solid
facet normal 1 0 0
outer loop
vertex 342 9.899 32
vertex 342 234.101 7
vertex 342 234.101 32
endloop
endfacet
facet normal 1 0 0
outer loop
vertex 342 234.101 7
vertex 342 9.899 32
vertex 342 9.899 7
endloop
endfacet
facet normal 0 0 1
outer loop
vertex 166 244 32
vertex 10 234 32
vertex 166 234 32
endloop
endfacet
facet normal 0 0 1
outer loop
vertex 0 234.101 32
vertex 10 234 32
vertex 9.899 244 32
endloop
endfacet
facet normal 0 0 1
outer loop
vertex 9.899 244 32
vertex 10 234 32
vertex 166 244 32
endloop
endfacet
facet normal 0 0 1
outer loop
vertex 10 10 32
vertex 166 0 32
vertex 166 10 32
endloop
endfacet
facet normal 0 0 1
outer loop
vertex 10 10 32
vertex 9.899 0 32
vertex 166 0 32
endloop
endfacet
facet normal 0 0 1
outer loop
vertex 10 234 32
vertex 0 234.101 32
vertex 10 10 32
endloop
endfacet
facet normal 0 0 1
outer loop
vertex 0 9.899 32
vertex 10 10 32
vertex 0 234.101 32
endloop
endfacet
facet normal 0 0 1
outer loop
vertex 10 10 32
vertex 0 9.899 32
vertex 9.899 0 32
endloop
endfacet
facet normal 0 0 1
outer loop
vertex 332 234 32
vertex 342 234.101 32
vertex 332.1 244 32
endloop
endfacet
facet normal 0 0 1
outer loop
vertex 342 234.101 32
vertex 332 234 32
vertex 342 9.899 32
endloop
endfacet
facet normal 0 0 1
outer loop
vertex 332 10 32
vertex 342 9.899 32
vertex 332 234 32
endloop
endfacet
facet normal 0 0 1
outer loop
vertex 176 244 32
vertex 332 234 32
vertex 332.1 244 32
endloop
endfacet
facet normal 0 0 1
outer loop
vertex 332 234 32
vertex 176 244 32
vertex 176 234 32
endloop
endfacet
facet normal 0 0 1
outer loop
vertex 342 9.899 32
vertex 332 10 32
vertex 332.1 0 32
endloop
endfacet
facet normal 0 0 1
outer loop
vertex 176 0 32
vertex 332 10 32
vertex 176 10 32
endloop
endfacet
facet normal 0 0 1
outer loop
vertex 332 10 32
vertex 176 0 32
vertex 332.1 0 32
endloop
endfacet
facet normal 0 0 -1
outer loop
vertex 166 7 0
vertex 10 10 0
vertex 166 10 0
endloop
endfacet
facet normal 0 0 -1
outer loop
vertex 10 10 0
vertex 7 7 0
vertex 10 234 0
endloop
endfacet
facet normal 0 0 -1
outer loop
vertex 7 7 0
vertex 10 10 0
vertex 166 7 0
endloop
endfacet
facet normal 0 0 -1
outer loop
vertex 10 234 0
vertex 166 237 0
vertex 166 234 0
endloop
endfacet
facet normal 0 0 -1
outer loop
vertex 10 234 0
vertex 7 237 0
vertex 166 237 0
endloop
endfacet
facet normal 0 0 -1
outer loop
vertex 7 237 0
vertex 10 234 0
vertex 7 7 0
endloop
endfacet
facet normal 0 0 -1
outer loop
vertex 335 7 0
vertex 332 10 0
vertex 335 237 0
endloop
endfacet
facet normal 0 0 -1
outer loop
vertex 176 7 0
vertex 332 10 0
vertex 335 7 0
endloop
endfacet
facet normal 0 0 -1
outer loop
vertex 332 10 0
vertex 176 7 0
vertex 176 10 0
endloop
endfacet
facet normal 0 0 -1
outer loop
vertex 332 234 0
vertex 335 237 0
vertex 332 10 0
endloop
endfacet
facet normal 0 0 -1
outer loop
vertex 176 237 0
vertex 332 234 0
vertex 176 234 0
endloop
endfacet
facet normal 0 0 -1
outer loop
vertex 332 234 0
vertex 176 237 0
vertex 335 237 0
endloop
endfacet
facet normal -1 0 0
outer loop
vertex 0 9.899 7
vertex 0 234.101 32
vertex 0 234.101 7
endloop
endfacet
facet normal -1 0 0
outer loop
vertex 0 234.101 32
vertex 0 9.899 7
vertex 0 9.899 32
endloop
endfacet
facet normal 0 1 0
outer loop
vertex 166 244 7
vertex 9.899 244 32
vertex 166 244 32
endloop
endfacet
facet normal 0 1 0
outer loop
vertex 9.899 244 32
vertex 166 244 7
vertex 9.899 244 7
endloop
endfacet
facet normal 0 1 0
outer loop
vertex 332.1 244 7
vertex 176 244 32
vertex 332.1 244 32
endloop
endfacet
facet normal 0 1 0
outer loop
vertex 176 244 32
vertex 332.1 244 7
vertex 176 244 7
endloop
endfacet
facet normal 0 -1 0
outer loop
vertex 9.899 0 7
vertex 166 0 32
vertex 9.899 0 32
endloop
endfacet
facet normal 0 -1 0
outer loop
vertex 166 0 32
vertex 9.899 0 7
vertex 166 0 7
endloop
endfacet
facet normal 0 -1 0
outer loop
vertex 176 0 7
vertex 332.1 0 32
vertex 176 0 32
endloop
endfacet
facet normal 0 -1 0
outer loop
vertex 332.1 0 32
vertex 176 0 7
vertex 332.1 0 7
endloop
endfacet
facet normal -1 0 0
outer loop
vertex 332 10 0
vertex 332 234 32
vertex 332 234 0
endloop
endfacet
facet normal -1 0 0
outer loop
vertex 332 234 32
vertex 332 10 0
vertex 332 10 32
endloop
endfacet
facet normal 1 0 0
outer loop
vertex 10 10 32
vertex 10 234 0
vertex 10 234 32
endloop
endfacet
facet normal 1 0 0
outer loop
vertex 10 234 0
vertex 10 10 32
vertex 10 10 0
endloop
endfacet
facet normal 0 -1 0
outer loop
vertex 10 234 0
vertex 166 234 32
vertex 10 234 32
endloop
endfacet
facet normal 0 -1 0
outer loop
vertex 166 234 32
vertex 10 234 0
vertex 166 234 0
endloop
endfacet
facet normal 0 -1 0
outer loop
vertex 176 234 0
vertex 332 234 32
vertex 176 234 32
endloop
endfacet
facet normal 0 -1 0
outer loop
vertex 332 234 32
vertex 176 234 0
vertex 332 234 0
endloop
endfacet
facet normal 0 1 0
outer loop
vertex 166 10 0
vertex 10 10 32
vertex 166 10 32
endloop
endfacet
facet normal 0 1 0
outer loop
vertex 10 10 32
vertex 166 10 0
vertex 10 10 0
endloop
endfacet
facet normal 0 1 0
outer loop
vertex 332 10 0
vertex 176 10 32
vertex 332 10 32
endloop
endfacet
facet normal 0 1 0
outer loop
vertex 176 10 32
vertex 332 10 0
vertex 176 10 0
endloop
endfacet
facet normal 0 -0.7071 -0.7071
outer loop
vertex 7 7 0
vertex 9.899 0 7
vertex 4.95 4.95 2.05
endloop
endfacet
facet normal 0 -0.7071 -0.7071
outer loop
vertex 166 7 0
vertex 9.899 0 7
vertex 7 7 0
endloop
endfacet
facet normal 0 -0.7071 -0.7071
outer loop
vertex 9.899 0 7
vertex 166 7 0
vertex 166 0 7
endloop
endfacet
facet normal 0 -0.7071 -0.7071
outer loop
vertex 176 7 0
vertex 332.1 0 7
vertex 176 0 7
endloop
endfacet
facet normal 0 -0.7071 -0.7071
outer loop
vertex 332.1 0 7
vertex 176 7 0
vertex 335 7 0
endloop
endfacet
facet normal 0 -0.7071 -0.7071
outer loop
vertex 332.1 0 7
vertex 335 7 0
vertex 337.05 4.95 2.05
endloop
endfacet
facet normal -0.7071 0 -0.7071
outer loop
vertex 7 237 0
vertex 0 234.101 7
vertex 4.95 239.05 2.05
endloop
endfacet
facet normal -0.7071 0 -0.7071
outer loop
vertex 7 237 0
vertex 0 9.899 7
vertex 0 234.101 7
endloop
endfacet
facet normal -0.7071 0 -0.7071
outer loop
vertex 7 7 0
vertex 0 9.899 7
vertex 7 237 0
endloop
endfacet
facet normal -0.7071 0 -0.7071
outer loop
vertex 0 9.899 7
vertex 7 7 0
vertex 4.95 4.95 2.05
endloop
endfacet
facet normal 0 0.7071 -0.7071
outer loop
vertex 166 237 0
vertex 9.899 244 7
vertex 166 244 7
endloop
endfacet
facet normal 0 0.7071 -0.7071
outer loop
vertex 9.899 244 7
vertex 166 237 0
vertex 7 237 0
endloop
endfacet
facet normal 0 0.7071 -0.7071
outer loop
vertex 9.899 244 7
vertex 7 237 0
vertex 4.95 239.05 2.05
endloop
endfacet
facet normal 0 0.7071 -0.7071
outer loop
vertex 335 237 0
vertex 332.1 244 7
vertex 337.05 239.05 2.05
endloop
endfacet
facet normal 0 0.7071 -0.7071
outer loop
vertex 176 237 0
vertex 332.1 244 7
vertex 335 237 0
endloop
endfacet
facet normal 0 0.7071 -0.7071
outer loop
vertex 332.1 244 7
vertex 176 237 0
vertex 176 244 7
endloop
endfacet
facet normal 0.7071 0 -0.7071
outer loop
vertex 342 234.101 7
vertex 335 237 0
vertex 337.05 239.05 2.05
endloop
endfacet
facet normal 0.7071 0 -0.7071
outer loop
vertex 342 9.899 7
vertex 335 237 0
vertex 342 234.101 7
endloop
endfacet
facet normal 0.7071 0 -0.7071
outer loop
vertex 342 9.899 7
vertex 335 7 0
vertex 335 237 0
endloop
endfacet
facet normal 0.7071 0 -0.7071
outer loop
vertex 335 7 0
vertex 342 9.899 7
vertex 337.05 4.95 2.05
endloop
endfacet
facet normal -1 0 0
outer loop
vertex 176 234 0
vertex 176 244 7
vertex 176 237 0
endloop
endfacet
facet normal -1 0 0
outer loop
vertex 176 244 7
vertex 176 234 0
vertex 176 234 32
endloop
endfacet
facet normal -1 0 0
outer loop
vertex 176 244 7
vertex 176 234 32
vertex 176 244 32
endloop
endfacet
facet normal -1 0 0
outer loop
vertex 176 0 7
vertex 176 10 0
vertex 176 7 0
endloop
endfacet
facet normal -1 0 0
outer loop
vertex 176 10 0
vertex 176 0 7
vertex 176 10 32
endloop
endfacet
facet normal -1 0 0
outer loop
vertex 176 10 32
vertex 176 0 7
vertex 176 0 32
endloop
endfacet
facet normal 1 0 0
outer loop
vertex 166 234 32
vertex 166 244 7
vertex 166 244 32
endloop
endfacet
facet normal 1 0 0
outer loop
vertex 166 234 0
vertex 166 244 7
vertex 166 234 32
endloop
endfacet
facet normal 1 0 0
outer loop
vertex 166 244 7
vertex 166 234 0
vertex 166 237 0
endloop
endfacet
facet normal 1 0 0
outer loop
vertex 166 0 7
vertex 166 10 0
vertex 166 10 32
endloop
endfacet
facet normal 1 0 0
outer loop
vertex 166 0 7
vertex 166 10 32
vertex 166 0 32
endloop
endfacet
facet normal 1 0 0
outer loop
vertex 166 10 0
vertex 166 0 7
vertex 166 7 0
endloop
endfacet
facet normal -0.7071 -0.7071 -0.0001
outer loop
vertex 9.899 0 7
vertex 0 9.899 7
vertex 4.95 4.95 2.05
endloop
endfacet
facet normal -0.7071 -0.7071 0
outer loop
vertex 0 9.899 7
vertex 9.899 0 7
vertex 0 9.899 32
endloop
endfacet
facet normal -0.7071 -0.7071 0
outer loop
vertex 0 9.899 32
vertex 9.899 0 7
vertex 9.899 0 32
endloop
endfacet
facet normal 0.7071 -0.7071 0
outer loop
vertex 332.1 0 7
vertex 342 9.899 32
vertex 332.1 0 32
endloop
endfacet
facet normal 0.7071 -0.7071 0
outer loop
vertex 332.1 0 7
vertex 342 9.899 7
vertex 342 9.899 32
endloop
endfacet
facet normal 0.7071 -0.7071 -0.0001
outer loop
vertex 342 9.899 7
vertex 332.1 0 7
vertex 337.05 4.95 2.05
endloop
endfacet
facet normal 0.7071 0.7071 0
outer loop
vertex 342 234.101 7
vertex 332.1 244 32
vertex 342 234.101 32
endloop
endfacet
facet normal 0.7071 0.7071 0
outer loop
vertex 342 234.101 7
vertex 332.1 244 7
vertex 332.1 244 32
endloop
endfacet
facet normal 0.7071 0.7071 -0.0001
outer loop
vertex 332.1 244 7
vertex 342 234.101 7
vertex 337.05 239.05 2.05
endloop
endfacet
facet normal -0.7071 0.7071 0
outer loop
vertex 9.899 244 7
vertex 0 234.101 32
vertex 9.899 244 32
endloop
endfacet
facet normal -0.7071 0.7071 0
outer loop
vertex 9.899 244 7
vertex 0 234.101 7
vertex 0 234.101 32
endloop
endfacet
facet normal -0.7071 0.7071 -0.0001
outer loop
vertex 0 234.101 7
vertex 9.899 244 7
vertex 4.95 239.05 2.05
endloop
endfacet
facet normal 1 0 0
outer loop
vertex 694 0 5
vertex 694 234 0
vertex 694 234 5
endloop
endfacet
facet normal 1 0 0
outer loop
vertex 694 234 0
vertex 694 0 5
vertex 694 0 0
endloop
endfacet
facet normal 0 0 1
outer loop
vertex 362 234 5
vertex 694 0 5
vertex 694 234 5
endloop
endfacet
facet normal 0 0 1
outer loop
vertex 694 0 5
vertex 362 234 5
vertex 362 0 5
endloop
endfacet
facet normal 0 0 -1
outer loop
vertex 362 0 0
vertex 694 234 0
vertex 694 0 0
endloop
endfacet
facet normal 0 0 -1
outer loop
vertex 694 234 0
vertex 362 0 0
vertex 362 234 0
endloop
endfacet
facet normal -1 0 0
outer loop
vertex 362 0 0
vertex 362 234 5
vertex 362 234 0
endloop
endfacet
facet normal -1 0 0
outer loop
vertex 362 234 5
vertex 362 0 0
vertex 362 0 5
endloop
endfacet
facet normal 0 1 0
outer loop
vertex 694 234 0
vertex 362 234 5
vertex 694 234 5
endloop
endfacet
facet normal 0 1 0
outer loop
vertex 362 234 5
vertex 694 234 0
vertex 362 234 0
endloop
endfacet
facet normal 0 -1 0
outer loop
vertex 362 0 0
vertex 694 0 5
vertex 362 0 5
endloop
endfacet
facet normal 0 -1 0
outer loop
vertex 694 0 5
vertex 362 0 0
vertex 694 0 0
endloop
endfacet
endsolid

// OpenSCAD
thick = 10;
plate = [342, 244, 5] - [thick, thick, 0];
h = 67 - 40 + 10 - plate[2];
box = [342, 244, h];
triangle = 7;

difference() {
    cube(box);
    translate([thick, thick, - 1]) cube(box - [2 * thick, 2 * thick, - 2]);

    translate([0, triangle, 0]) rotate([45 + 90, 0, 0]) cube([box[0], 10, h]);
    translate([triangle, 0, 0]) rotate([0, - 45 - 90, 0]) cube([h, box[1], h]);
    translate([0, box[1] - triangle, 0]) rotate([- 45, 0, 0]) cube([box[0], h, h]);
    translate([box[0] - triangle, 0, 0]) rotate([0, 45, 0]) cube([h, box[1], h]);
    translate(box / 2) cube([10, box[1], box[2]], center = true);

    translate([0, 0, box[2] / 2]) rotate([0, 0, 45]) cube([2 * triangle, box[1], box[2] + 1], center = true);
    translate([box[0], 0, box[2] / 2]) rotate([0, 0, - 45])  cube([2 * triangle, box[1], box[2] + 1], center = true);
    translate([box[0], box[1], box[2] / 2]) rotate([0, 0, 45])  cube([2 * triangle, box[1], box[2] + 1], center = true);
    translate([0, box[1], box[2] / 2]) rotate([0, 0, - 45])  cube([2 * triangle, box[1], box[2] + 1], center = true);
}

translate([box[0] + 20, 0, 0]) cube(plate);
